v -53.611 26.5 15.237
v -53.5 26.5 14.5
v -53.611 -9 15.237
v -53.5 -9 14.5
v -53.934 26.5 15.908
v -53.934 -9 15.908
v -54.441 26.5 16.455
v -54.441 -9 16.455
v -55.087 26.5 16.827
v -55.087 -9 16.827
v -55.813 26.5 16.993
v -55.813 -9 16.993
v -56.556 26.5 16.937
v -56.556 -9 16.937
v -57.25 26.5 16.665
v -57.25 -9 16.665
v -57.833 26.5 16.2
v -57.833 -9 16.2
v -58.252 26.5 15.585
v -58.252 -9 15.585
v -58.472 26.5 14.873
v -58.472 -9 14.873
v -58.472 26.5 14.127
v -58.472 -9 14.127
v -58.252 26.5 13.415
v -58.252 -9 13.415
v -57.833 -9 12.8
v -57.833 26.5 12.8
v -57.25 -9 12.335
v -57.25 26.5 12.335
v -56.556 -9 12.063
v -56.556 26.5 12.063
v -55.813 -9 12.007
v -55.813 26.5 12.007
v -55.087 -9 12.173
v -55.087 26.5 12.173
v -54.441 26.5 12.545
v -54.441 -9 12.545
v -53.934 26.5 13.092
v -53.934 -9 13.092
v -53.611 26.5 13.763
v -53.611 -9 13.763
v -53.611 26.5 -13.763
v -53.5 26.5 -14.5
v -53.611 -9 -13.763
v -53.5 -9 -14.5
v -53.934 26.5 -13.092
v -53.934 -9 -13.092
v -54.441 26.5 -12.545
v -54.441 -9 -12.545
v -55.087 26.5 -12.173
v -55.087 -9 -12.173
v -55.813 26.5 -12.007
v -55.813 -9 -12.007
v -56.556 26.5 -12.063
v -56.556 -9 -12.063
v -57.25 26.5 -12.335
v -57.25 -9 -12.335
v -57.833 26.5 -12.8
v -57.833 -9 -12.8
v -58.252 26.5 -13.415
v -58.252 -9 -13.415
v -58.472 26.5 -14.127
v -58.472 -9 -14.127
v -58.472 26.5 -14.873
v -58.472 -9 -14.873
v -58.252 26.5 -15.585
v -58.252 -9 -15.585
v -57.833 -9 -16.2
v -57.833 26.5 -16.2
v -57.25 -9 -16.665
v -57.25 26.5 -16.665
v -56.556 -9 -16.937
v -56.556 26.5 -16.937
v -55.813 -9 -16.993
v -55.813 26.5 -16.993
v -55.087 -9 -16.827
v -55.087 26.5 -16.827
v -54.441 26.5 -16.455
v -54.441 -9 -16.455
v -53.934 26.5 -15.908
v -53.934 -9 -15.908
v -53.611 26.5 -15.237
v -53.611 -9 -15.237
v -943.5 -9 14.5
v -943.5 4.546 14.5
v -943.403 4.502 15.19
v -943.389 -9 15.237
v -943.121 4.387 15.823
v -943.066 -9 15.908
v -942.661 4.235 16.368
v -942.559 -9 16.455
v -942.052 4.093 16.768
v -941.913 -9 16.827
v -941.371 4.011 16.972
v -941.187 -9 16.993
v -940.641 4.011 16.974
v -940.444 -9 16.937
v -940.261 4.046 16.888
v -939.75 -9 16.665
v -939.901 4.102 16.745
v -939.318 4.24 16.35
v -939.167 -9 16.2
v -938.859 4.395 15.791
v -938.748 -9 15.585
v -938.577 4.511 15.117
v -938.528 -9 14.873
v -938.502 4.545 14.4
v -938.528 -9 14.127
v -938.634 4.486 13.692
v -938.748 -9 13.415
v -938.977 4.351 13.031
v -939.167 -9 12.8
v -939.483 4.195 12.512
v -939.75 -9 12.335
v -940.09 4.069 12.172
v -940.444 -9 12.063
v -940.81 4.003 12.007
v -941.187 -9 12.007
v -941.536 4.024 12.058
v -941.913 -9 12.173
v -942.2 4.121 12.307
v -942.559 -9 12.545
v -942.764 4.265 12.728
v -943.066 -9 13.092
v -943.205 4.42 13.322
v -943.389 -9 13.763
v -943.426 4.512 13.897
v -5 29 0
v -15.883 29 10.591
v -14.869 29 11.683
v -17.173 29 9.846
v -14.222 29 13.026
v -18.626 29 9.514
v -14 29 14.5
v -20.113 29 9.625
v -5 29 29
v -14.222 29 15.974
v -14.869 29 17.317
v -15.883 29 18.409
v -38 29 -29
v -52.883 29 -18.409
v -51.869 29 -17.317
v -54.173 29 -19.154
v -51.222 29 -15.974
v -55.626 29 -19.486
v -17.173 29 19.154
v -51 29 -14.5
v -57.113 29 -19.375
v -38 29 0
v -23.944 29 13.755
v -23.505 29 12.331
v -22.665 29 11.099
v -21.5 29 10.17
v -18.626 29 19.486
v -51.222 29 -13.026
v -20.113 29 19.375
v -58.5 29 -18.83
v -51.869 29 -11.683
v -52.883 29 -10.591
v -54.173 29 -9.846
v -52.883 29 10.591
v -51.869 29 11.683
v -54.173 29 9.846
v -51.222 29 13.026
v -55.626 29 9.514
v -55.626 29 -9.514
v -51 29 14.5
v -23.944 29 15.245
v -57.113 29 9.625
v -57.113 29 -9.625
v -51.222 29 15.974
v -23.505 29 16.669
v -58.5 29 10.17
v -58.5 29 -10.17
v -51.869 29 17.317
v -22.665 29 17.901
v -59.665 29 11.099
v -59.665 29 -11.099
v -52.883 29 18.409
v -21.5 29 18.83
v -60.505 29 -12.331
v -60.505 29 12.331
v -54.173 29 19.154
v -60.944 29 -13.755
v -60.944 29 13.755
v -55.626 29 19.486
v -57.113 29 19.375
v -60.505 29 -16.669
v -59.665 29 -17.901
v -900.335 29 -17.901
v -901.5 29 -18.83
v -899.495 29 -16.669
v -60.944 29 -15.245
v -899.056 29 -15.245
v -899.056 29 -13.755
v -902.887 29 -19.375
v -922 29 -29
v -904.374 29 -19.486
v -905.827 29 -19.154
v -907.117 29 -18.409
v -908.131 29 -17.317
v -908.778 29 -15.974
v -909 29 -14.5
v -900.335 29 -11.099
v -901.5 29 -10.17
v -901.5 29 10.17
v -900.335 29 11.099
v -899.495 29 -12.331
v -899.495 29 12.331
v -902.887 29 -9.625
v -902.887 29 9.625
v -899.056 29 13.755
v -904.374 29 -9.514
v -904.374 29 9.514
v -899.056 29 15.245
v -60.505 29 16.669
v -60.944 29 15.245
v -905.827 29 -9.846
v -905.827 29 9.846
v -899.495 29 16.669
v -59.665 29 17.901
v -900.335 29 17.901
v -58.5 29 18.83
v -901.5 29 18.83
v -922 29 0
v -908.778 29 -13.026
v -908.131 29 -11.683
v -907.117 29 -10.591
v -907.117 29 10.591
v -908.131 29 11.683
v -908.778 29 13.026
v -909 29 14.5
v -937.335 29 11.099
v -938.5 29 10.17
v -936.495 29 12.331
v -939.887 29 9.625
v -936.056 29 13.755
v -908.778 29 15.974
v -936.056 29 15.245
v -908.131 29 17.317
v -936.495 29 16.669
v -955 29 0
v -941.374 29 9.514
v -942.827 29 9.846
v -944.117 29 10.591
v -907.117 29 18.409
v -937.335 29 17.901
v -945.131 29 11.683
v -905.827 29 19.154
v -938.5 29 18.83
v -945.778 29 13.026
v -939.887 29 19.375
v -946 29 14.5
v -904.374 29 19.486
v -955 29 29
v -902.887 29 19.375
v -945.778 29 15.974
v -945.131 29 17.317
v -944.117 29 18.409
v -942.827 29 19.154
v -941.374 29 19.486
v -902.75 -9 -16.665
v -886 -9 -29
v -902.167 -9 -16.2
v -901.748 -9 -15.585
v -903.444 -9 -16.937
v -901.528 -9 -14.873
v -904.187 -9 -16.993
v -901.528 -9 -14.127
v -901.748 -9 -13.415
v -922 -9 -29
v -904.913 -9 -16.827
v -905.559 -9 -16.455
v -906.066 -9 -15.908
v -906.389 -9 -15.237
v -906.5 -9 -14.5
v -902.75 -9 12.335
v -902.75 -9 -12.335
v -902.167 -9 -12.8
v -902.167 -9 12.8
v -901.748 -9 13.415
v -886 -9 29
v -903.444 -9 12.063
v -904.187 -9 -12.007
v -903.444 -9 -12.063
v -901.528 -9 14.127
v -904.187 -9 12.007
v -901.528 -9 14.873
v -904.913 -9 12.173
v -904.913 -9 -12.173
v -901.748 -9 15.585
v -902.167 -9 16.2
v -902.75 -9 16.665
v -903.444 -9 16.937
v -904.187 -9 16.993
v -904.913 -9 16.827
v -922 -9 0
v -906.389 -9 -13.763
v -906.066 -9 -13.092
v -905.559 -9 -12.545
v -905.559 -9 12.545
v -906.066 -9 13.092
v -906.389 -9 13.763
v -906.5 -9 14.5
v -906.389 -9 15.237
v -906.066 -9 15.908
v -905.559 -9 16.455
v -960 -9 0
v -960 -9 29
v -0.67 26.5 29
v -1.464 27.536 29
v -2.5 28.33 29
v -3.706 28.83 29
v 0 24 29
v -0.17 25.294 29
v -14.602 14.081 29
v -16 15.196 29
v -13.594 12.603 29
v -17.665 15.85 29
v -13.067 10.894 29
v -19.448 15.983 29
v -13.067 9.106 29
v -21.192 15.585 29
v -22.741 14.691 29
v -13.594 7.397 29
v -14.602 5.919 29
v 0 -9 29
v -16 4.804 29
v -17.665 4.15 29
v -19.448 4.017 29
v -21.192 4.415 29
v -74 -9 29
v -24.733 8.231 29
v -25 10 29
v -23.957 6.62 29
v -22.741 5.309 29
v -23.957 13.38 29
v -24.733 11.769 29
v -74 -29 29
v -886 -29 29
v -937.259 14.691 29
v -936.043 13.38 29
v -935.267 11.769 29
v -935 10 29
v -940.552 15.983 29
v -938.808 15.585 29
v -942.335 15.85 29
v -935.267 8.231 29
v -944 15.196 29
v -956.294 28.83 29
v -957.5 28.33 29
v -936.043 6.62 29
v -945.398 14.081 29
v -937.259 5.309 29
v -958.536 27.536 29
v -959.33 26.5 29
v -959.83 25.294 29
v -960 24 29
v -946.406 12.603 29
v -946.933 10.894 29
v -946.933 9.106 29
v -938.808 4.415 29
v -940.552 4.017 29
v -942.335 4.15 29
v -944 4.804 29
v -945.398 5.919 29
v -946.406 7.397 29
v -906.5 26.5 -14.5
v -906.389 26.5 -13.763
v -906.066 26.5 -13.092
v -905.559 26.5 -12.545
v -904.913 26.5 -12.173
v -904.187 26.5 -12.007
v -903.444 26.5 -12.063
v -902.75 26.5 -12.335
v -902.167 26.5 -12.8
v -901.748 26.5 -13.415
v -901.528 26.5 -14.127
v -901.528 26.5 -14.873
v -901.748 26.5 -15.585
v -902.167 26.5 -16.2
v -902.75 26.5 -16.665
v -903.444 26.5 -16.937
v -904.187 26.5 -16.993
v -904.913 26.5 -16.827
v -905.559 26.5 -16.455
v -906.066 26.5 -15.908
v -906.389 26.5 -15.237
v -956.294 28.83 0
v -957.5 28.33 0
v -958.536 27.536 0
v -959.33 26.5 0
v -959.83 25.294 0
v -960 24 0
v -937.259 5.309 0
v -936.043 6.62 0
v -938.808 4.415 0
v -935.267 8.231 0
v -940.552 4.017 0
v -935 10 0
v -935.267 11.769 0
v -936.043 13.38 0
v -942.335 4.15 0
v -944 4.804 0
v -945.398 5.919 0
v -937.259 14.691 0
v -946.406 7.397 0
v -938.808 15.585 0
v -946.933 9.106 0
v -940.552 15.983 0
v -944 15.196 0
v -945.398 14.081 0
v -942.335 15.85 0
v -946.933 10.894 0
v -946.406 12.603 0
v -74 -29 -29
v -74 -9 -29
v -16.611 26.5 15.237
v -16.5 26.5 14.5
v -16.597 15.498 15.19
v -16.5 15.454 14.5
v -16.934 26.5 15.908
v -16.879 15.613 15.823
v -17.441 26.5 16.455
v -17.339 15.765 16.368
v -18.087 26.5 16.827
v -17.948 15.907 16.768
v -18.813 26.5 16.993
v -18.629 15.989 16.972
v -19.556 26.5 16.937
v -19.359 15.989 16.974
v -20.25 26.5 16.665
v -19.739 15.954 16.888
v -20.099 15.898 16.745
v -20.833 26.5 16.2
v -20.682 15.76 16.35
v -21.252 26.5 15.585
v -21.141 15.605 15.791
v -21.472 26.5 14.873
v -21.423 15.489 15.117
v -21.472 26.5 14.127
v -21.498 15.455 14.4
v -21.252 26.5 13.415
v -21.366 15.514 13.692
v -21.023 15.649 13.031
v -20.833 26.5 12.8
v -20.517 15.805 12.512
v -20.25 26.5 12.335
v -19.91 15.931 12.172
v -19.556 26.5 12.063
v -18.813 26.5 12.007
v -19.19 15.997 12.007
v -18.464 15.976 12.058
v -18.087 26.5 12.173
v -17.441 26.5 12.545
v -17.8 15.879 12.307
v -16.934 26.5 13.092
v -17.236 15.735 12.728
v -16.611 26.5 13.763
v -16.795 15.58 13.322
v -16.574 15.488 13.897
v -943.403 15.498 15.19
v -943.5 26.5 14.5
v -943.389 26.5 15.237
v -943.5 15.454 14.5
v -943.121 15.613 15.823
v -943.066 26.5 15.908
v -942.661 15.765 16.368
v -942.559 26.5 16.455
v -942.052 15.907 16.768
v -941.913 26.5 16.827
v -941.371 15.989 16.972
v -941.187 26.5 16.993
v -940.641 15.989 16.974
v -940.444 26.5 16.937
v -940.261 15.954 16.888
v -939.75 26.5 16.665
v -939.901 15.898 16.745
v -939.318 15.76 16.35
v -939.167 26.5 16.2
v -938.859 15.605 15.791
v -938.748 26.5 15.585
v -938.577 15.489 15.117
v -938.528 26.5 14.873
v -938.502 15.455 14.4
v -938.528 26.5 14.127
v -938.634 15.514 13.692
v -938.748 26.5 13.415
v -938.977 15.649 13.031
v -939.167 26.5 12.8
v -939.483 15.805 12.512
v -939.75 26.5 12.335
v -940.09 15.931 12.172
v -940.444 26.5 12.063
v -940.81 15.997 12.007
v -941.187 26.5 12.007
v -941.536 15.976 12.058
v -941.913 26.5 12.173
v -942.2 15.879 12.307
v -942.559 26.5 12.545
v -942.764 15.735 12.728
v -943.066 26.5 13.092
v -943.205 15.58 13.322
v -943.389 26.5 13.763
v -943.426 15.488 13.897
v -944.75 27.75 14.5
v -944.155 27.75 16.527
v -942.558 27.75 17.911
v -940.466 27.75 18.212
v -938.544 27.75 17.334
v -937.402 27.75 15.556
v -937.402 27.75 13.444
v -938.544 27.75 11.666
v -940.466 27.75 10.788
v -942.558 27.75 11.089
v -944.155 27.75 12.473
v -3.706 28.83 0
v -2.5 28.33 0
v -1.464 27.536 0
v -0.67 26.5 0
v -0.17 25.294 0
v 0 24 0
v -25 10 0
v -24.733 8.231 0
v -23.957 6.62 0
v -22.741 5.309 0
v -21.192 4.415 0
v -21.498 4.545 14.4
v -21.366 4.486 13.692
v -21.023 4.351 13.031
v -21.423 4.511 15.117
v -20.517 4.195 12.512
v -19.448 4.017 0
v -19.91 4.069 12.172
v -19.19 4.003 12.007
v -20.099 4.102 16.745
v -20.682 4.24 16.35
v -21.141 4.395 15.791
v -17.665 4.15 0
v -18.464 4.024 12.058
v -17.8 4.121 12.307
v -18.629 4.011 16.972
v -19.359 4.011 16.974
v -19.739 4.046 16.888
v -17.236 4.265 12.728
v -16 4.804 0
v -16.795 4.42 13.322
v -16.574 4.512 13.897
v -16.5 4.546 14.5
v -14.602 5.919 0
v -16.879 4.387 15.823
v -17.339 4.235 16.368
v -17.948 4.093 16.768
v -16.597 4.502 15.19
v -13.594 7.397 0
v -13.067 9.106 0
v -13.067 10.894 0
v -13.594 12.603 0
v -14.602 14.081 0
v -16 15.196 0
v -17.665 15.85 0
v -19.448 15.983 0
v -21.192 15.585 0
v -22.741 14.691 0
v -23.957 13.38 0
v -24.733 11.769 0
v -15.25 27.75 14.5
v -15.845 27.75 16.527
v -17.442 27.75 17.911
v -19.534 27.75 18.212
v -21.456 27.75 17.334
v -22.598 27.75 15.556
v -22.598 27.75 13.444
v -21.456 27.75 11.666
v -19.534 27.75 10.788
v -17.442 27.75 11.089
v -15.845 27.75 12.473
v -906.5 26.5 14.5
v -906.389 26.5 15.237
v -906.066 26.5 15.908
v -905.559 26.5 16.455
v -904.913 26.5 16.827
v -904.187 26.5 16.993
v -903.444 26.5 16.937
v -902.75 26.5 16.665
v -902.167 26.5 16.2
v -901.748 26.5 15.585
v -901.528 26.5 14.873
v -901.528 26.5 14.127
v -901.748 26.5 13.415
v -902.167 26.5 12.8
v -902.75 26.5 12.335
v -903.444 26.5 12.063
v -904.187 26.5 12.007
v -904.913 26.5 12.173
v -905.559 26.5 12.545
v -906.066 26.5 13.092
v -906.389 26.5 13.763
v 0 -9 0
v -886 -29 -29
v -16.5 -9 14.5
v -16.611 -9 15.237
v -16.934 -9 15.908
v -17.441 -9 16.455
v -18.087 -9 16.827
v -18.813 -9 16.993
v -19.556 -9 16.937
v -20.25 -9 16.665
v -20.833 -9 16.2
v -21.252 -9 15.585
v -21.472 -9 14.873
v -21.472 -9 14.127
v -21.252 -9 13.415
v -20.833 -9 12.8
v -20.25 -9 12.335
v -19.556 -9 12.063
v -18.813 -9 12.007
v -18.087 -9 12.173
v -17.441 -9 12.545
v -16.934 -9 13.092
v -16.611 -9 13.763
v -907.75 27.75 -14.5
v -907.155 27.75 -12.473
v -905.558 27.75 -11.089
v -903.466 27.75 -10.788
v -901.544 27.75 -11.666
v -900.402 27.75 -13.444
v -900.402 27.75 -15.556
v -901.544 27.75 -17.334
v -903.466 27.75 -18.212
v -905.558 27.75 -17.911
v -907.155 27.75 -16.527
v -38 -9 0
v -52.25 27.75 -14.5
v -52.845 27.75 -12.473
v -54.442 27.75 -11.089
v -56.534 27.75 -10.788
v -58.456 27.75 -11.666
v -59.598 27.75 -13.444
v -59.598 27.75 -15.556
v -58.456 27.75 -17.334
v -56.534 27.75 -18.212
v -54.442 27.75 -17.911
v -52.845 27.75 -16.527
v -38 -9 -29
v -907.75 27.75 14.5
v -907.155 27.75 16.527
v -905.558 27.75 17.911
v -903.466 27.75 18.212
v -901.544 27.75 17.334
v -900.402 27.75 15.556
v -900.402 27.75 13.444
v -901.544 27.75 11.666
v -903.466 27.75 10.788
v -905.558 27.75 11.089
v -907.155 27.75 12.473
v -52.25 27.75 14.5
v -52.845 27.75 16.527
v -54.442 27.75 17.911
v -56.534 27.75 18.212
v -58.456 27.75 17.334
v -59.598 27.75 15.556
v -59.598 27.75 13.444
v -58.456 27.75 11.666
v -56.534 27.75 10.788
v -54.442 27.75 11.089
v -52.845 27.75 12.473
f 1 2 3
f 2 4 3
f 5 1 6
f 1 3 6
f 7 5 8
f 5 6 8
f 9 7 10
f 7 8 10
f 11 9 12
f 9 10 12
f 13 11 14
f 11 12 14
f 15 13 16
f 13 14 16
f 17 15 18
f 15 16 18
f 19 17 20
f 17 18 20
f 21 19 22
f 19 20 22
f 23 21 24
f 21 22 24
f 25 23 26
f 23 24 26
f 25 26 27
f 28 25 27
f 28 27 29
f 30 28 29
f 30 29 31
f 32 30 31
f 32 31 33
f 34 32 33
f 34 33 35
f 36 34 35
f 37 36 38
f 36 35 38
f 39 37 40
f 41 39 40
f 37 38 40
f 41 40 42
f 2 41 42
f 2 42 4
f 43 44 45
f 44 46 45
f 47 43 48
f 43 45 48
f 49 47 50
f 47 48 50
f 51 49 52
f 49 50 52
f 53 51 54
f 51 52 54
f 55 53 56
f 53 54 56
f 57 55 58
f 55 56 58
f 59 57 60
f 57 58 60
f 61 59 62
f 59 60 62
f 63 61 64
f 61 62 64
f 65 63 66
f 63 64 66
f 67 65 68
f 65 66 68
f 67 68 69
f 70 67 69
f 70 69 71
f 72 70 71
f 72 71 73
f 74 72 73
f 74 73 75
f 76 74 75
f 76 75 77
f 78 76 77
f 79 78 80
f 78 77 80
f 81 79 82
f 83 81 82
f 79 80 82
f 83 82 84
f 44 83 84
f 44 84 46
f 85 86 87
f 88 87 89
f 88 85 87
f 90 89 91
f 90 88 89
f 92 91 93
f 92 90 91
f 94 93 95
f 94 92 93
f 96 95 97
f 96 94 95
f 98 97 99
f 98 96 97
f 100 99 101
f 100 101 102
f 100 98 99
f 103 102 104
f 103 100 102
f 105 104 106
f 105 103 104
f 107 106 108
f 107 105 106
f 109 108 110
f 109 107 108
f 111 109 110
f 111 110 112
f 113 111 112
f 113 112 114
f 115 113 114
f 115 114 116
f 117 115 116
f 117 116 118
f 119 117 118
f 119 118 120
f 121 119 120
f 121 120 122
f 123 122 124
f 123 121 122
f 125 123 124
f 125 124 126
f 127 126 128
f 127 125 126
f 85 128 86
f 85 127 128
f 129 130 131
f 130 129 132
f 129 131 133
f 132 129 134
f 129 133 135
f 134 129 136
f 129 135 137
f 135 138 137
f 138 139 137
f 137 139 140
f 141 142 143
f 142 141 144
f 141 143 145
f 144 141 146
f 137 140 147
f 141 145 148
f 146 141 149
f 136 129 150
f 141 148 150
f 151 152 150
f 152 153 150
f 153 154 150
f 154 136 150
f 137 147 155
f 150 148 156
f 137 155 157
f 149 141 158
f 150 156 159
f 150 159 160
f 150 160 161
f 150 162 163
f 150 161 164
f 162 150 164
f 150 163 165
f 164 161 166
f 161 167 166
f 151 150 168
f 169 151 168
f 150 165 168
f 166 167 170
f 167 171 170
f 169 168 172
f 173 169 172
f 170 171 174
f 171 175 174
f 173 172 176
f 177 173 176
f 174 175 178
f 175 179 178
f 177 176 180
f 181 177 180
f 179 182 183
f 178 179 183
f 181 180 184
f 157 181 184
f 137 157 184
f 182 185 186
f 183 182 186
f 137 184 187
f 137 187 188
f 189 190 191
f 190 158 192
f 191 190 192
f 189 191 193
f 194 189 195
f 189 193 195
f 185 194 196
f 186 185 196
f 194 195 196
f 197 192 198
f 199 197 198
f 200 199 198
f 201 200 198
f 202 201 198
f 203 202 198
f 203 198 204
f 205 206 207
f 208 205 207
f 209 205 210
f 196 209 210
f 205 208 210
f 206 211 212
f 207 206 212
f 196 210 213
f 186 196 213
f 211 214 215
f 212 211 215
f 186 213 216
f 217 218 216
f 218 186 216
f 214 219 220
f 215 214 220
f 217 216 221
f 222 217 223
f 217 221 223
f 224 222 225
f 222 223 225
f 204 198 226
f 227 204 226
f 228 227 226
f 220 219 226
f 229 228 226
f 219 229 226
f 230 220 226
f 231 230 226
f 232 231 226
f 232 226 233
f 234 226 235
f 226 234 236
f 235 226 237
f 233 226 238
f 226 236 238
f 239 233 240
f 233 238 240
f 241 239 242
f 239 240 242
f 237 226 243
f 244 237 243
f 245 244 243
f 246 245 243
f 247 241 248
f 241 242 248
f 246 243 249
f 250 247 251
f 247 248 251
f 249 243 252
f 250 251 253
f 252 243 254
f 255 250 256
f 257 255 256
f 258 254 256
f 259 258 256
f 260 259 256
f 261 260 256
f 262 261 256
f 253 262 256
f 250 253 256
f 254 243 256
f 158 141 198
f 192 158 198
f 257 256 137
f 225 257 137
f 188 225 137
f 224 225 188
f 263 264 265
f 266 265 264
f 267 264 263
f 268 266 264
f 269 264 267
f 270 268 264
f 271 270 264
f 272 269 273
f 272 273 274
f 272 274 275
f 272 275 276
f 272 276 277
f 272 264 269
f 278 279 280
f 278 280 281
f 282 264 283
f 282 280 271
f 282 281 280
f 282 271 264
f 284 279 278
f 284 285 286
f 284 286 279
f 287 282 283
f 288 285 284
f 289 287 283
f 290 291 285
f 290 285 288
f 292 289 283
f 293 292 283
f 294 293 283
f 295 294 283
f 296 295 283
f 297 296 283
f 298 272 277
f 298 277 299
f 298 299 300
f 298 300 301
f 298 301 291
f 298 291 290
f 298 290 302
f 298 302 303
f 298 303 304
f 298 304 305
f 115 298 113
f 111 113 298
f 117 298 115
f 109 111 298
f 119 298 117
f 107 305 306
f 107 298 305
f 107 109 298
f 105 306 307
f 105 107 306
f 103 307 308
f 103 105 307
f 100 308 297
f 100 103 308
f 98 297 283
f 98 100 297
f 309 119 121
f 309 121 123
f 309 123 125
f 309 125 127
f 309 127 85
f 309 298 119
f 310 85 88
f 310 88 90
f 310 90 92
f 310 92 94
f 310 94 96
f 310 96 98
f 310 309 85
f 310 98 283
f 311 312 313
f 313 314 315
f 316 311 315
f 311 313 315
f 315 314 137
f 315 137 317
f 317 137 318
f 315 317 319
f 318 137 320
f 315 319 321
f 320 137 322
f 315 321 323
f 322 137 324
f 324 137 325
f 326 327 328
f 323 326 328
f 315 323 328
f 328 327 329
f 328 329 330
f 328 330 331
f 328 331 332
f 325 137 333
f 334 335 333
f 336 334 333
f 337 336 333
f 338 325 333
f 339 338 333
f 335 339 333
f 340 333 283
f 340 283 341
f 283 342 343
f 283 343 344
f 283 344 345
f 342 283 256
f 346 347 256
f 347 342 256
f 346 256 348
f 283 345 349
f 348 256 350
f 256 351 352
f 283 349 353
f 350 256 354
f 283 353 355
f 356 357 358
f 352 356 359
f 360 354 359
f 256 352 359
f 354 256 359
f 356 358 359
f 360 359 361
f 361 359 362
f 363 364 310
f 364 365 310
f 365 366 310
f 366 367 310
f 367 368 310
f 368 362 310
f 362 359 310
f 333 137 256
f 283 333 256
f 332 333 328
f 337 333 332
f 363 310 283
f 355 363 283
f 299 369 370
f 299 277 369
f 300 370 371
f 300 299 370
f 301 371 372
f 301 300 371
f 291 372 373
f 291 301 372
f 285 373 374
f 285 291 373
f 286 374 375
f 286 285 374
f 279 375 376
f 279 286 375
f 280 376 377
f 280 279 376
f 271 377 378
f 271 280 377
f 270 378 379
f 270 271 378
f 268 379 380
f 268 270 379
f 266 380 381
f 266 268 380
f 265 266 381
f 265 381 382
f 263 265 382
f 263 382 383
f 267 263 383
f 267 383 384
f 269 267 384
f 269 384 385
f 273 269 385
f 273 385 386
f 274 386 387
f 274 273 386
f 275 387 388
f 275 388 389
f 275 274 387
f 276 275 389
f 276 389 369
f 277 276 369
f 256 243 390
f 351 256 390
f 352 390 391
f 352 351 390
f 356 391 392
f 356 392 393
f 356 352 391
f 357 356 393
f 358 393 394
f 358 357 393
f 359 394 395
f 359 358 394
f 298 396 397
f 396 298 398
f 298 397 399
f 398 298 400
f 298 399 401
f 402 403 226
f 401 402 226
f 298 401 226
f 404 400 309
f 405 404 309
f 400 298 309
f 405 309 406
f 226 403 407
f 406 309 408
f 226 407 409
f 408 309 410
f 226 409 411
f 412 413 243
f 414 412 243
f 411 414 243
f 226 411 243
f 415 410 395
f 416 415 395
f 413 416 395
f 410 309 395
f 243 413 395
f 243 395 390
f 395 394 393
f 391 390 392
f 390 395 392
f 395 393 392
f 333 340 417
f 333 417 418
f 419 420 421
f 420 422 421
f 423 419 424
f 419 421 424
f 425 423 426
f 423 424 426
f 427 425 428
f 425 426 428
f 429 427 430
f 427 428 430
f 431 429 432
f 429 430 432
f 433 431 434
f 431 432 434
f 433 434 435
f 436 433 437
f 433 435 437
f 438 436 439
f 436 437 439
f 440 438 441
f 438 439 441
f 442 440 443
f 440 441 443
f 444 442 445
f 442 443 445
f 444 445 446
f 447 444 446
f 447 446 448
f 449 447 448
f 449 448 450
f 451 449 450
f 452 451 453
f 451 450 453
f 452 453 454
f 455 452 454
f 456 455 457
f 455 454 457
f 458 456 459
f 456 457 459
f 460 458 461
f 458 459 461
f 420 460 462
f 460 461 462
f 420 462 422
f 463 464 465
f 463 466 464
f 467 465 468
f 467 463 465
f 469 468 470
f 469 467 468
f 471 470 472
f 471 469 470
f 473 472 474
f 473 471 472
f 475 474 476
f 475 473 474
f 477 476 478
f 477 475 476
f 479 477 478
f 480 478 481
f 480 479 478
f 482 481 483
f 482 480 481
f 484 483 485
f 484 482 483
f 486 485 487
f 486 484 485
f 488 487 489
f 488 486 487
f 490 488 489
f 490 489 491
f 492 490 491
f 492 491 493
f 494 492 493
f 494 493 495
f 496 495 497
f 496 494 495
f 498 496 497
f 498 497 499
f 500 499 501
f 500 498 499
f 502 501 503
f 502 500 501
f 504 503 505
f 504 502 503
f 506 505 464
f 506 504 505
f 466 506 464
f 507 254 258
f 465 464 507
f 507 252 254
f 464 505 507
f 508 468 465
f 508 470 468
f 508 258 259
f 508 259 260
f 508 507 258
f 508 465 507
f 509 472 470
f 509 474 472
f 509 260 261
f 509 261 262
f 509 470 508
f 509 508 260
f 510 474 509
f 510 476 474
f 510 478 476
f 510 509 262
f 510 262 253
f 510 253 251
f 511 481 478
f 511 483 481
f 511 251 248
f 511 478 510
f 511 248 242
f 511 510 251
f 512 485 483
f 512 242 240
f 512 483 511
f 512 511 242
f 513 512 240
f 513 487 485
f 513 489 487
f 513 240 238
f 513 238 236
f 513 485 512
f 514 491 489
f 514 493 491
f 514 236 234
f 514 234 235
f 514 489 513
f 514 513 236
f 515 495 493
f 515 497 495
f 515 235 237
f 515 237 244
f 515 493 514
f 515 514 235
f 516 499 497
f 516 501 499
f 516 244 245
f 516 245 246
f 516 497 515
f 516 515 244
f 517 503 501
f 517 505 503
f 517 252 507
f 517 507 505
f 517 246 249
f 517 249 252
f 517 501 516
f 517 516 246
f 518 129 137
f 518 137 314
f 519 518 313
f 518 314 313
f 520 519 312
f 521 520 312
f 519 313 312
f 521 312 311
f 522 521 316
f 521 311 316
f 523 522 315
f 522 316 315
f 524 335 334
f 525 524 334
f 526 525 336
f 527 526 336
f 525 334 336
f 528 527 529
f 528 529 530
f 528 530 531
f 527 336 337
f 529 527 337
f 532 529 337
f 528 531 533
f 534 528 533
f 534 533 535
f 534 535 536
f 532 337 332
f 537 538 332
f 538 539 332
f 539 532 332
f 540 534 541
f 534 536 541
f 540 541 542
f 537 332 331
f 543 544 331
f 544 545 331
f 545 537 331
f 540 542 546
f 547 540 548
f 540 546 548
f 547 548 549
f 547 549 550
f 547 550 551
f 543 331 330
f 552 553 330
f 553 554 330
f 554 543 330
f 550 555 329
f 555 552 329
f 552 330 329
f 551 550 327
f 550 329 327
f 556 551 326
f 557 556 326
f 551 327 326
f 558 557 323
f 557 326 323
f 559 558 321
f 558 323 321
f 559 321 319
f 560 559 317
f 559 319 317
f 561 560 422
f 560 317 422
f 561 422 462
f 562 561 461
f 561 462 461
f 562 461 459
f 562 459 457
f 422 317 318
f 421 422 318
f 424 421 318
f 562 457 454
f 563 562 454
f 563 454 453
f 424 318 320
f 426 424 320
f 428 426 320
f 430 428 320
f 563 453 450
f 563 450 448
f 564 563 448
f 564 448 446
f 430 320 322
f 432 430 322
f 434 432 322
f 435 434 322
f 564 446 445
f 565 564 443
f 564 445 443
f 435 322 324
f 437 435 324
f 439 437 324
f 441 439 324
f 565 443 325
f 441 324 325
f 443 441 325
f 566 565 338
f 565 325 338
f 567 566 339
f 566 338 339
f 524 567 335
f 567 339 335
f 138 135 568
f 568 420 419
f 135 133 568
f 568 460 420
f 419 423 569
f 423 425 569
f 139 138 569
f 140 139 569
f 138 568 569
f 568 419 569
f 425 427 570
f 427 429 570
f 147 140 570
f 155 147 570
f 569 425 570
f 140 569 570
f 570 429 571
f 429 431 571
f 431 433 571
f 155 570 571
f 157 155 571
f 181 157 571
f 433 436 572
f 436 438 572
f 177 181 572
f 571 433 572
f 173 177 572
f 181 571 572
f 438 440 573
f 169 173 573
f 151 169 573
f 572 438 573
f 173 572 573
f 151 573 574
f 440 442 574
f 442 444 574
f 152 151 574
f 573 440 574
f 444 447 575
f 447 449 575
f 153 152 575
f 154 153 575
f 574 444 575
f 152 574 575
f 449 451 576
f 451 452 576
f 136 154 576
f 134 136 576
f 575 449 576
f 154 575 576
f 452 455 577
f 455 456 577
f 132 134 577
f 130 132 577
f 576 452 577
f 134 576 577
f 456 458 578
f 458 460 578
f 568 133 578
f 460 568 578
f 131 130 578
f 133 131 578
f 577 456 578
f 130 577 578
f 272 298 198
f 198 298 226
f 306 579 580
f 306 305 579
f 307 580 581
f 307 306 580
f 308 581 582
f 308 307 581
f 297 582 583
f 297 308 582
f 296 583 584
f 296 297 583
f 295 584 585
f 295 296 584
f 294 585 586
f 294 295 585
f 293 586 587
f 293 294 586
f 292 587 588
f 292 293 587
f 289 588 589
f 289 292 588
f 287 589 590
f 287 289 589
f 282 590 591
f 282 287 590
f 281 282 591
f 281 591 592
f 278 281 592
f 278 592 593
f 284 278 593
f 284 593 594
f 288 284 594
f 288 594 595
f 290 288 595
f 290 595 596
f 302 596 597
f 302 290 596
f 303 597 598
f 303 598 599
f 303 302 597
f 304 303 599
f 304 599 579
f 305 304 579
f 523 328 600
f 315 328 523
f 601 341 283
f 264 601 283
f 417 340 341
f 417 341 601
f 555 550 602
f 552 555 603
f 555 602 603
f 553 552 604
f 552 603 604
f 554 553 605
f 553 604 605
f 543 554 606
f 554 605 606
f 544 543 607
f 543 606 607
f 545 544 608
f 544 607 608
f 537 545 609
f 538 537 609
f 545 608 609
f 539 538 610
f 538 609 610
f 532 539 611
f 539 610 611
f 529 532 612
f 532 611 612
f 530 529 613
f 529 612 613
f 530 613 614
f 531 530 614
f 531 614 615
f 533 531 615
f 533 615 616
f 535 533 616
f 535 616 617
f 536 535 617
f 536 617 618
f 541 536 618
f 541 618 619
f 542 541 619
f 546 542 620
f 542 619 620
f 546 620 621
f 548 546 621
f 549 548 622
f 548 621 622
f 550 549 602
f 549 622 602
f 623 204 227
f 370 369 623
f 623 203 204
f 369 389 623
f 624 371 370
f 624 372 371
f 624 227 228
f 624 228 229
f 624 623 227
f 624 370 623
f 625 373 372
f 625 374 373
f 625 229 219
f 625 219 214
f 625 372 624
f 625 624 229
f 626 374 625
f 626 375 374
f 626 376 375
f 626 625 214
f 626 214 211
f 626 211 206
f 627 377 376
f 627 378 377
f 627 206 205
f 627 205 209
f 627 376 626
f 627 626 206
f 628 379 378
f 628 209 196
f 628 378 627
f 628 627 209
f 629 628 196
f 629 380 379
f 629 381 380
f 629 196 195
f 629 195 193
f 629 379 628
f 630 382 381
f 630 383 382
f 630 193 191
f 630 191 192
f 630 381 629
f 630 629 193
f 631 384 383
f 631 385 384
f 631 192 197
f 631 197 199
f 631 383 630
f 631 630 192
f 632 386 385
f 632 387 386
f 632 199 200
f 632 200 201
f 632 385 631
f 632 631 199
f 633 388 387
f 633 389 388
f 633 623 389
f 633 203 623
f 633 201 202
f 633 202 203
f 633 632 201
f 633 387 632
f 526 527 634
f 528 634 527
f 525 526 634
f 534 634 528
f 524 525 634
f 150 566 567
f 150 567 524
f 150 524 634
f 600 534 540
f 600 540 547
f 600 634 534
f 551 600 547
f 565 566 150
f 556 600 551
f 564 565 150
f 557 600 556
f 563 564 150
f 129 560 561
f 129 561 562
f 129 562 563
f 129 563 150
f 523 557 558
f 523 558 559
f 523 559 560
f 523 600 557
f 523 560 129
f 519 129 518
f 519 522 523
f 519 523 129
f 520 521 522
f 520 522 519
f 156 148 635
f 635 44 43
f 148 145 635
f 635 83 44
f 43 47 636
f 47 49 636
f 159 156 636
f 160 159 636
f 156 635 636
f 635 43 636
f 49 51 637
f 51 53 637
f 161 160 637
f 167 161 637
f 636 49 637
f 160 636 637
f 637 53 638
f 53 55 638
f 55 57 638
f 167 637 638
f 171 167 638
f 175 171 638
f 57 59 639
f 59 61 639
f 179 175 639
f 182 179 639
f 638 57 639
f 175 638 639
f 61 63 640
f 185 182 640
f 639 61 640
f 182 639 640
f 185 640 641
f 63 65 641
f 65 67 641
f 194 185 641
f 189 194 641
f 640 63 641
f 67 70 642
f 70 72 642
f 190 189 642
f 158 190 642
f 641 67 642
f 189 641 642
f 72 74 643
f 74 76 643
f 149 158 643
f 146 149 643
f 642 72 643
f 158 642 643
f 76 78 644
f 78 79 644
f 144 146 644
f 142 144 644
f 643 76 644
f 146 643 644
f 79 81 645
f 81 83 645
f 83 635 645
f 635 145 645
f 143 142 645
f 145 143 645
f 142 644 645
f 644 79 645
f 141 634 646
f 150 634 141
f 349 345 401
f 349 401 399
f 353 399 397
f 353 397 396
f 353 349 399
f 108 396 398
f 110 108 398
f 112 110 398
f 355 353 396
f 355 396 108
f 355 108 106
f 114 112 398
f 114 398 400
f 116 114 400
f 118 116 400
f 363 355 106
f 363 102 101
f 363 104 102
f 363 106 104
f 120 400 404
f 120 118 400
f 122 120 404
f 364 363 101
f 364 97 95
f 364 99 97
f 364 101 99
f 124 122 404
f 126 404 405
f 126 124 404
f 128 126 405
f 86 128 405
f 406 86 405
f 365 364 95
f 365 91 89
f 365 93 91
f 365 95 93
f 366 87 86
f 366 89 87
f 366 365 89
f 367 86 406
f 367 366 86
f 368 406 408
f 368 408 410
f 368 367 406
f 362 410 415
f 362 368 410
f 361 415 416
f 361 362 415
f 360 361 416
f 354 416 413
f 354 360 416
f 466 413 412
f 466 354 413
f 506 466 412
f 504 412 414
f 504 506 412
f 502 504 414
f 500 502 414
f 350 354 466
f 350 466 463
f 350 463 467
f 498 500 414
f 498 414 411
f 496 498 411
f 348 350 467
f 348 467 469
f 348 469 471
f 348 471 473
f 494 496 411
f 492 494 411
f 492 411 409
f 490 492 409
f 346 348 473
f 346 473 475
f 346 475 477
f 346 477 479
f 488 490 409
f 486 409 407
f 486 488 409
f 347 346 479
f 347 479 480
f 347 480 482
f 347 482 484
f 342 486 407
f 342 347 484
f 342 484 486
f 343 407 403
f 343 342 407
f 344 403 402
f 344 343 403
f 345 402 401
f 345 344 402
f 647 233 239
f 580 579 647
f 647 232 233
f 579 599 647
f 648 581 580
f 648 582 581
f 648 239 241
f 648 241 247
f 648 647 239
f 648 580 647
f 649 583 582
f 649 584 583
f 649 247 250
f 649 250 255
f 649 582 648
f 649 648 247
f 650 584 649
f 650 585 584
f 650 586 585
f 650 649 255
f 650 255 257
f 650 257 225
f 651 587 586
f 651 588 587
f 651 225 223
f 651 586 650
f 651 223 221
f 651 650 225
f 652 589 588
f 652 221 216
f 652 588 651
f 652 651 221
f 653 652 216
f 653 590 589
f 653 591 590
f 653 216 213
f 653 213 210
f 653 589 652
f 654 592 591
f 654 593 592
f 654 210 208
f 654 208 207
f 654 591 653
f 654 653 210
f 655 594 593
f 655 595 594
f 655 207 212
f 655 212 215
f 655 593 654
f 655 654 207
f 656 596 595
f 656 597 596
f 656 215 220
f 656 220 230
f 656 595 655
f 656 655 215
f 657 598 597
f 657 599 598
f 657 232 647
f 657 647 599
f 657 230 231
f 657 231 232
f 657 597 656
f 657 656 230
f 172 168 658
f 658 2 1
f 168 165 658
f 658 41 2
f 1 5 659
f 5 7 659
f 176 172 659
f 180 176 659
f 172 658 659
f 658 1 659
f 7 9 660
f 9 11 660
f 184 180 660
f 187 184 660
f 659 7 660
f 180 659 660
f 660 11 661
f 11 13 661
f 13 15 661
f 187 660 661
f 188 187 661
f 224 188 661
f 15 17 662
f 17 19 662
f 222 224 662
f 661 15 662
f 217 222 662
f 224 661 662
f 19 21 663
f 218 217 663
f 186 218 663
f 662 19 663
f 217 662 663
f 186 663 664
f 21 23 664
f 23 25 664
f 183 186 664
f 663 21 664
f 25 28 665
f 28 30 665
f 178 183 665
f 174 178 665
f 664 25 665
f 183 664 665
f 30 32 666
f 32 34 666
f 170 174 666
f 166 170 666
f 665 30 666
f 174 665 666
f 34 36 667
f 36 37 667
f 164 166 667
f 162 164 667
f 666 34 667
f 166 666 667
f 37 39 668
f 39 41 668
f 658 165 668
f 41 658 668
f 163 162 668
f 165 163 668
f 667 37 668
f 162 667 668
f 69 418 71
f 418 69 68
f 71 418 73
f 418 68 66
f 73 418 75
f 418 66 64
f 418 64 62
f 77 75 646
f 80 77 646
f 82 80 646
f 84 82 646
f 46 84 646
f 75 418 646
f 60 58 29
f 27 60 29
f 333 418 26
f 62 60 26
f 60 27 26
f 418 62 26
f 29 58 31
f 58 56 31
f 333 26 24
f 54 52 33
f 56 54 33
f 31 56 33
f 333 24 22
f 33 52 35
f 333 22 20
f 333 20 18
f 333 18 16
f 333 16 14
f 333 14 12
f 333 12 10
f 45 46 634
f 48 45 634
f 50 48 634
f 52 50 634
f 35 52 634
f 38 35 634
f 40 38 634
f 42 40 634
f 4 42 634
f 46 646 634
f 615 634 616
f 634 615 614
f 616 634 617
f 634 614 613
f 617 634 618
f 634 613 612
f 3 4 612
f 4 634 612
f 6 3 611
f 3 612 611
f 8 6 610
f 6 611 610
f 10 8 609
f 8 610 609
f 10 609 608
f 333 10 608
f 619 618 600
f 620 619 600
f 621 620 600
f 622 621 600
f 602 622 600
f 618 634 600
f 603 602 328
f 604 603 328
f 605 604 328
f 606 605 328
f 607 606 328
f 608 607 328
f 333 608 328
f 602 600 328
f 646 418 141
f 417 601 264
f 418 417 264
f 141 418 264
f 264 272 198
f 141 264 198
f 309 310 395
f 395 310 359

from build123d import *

# Parameters (mm, degrees)
F0_W           = 38
F0_H           = 29
F1_DEPTH       = 480
F2_DEPTH       = 74
F3_DEPTH       = 38
F4_R           = 5
F7_D           = 12
F8_D           = 5
F8_CSINK_D     = 10
F8_CSINK_ANGLE = 90


with BuildPart() as f1:
    # F0 (on Right) → F1 (new body)
    with BuildSketch(Plane.YZ):
        with Locations((10, -14.5)):
            Rectangle(F0_W, F0_H)
        with Locations((10, 14.5)):
            Rectangle(F0_W, F0_H)
        Polygon((-9, 0), (-9, 29), (-29, 29), (-29, -29), (-9, -29), align=None)
    extrude(amount=-F1_DEPTH)

    # F0 (on Right) → F2 (cut)
    with BuildSketch(Plane.YZ):
        Polygon((-9, 0), (-9, 29), (-29, 29), (-29, -29), (-9, -29), align=None)
    extrude(amount=-F2_DEPTH, mode=Mode.SUBTRACT)

    # F0 (on Right) → F3 (cut)
    with BuildSketch(Plane.YZ):
        with Locations((10, -14.5)):
            Rectangle(F0_W, F0_H)
    extrude(amount=-F3_DEPTH, mode=Mode.SUBTRACT)

    # F4
    f4_edges = [f1.edges().sort_by_distance(p)[0] for p in [
        (0, 29, 14.5),
    ]]
    fillet(f4_edges, radius=F4_R)

    # F7 (through all)
    with Locations(Plane(origin=(0, 0, 0), x_dir=(1, 0, 0), z_dir=(0, 0, -1))):
        with Locations((-19, -10)):
            Hole(F7_D / 2)

    # F8 (through all)
    with Locations(Plane(origin=(0, 29, 0), x_dir=(-1, 0, 0), z_dir=(0, 1, 0))):
        with Locations((19, 14.5), (56, 14.5), (56, -14.5)):
            CounterSinkHole(F8_D / 2, F8_CSINK_D / 2, counter_sink_angle=F8_CSINK_ANGLE)

    # F9: F1 across face


with BuildPart() as f1_1:
    add(f1.part)
    add(f1.part.mirror(Plane(origin=(-480, 0, 0), x_dir=(0, 1, 0), z_dir=(-1, 0, 0))))


solid = f1_1.part
